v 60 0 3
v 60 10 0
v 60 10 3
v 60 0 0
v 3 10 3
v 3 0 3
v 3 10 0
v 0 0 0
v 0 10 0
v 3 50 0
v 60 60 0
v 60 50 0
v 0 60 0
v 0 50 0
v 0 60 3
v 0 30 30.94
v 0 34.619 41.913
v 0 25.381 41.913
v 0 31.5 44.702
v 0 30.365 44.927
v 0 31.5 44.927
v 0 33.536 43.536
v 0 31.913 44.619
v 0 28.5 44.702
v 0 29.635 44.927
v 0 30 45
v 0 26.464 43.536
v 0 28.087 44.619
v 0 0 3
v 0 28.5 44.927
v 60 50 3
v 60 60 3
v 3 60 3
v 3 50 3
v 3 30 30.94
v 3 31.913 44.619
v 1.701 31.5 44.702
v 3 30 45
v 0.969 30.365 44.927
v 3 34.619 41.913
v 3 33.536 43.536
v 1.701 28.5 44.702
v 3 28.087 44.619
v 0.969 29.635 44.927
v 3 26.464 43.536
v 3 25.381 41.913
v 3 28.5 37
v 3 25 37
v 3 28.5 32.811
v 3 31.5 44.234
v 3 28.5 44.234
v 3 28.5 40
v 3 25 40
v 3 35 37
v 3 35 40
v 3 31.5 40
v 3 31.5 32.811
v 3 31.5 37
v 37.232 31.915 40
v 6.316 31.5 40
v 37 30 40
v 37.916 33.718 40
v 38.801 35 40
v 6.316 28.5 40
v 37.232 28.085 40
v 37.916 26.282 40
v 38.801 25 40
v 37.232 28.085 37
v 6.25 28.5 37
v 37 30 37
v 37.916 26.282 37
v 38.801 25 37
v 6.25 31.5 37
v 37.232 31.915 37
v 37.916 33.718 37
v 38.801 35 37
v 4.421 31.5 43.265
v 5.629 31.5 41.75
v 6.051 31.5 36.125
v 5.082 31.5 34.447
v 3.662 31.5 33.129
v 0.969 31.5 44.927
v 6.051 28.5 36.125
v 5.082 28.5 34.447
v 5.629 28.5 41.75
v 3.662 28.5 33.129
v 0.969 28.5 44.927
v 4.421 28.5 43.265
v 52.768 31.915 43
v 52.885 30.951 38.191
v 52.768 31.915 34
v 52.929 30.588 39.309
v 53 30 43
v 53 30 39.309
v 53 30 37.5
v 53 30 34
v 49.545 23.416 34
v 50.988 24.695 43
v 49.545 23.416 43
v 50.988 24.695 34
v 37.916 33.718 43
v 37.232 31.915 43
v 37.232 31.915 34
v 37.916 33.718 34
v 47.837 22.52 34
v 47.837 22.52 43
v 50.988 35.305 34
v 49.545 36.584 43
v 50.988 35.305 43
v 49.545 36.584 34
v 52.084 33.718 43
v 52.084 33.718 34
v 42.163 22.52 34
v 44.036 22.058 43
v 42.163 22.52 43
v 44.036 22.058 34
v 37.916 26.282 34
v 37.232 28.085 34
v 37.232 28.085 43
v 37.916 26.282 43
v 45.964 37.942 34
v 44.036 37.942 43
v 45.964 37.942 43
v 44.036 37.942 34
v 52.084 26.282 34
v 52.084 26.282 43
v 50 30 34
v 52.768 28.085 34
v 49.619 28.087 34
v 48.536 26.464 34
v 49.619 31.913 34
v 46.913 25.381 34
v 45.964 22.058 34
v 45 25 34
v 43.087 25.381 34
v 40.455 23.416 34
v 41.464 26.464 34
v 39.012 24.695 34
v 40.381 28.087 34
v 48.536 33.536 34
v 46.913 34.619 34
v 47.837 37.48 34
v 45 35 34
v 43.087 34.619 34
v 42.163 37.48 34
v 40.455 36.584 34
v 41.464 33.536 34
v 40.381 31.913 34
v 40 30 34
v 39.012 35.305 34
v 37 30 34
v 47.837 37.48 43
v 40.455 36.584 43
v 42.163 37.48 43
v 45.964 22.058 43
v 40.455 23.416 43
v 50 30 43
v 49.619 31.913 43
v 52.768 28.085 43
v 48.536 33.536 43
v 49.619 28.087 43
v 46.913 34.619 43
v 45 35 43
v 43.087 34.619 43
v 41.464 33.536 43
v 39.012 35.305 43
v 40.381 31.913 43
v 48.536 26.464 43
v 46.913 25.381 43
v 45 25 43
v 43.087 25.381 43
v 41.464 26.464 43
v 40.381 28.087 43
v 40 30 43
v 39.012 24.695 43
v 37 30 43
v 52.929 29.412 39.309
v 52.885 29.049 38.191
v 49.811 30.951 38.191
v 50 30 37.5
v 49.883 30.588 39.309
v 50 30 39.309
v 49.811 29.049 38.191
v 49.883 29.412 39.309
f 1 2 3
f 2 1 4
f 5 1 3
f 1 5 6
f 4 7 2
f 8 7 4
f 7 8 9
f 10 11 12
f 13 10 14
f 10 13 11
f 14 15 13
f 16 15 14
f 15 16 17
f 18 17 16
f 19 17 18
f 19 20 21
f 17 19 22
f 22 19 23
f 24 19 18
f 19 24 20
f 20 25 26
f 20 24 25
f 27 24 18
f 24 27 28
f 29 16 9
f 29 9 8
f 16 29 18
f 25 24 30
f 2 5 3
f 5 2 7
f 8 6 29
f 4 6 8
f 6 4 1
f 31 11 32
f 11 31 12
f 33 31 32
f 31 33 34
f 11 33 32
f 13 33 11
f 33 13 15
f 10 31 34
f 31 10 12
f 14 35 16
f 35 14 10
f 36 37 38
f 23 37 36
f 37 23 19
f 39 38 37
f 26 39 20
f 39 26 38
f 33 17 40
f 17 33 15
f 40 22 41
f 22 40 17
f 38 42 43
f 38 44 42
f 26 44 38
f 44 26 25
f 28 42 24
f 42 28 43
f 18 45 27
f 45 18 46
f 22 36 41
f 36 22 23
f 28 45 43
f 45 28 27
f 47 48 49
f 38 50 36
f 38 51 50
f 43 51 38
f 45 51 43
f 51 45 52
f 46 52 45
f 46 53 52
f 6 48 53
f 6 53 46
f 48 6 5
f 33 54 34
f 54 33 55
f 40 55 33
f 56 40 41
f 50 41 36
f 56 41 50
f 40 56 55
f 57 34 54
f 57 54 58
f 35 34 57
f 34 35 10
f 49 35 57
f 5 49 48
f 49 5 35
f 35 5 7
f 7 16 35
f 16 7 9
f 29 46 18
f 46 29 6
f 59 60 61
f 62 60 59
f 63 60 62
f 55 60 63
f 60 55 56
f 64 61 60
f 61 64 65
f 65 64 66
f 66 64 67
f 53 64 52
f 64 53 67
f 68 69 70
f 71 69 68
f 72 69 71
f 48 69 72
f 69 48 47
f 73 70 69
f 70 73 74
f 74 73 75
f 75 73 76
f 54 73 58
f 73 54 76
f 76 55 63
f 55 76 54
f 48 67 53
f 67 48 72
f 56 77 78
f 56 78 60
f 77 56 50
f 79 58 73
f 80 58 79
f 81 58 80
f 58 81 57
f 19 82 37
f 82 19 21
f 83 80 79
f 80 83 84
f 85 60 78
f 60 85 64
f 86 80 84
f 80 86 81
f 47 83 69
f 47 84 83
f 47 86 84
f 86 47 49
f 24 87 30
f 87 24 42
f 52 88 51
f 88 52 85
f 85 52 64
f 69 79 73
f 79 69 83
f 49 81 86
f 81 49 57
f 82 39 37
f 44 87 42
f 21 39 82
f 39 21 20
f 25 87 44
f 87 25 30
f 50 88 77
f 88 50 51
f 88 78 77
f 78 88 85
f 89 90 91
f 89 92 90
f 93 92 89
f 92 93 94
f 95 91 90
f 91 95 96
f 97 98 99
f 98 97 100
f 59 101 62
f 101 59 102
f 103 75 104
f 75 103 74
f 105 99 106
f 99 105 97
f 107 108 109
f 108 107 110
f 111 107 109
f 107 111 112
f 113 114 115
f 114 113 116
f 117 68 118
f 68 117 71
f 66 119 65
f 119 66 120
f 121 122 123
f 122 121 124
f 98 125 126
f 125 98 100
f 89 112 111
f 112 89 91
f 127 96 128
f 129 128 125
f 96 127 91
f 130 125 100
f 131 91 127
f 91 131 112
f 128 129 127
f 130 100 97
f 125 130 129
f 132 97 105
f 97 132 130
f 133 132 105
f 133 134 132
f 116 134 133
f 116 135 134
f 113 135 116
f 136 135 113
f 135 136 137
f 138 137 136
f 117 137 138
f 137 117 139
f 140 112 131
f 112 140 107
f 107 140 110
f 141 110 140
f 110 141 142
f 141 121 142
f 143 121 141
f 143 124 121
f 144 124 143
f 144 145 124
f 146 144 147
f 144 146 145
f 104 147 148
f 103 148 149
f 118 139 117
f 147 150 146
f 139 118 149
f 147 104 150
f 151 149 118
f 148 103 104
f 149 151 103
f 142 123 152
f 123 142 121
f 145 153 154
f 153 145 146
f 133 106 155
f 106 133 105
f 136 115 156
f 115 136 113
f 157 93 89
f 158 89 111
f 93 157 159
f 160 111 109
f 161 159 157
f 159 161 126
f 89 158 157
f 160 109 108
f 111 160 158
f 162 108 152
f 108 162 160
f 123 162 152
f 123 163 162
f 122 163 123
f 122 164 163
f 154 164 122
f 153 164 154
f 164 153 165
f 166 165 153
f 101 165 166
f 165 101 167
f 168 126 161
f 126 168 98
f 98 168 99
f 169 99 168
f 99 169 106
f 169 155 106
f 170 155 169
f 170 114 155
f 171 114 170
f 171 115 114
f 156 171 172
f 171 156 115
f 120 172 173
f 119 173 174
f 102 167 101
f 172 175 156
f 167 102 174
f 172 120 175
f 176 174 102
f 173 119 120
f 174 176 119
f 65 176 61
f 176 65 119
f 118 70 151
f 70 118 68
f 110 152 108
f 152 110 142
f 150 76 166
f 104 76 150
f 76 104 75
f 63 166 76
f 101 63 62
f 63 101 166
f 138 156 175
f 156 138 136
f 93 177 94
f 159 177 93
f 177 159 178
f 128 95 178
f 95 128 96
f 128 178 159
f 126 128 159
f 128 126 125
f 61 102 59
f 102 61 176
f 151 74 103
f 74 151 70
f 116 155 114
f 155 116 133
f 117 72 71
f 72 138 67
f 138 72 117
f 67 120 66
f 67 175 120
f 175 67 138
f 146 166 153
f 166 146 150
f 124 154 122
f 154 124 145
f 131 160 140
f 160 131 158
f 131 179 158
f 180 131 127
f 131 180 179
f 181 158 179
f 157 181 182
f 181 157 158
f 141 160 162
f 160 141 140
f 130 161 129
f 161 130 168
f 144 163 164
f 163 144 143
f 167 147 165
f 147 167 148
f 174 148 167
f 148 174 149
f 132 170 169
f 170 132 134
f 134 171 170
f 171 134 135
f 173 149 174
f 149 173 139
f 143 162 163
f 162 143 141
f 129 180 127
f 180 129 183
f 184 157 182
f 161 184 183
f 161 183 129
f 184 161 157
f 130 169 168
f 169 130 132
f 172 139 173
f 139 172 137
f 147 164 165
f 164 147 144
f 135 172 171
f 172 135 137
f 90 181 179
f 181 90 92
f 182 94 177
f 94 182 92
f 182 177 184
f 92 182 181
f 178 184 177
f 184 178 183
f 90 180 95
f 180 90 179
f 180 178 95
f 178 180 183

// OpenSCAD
// [FL_INDEX: keywords="openscad, 3d_parametric, Simple_Customizable_Ring_Stand, csg_solid" | COT="Parametric OpenSCAD design from 3DCodeverse"]
// Title: Simple Customizable Ring Stand

extremes=80;
LegLength=60;
LegWidth=10;
Thickness=3;
LegSpacing=40;
strutwidth=5;
height=40;
probeRadius=5;
screwRadius=1;

intersection(){
	cube(extremes);
	difference(){
		union(){
			cube([LegLength,LegWidth,Thickness]);
			translate([0,LegSpacing+LegWidth,0])cube([LegLength,LegWidth,Thickness]);
			hull(){
				translate([0,LegSpacing+LegWidth,0])cube([Thickness,LegWidth,Thickness]);
				translate([0,(LegSpacing+LegWidth)/2+strutwidth,height])rotate([0,90,0])cylinder(r=strutwidth,h=Thickness);
			}
			hull(){
				translate([0,0,0])cube([Thickness,LegWidth,Thickness]);
				translate([0,(LegSpacing+LegWidth)/2+strutwidth,height])rotate([0,90,0])cylinder(r=strutwidth,h=Thickness);
			}
			translate([0,(LegSpacing+LegWidth)/2,height-Thickness])cube([LegLength*.75,LegWidth,Thickness]);
			translate([0,(LegSpacing+LegWidth)/2+strutwidth-Thickness/2,height-Thickness/2])rotate([0,90,90])cylinder(r=strutwidth+Thickness/2,h=Thickness);
			translate([LegLength*.75,(LegSpacing+LegWidth)/2+probeRadius,height-2*Thickness])cylinder(r=probeRadius+Thickness,h=3*Thickness);
		}
		translate([LegLength*.75,(LegSpacing+LegWidth)/2+probeRadius,height-2*Thickness])cylinder(r=probeRadius,h=7*Thickness);
		translate([LegLength*.75+probeRadius-Thickness,(LegSpacing+LegWidth)/2+probeRadius,height-.5*Thickness])rotate([0,90,0])cylinder(r=screwRadius,h=7*Thickness);
	}
}
